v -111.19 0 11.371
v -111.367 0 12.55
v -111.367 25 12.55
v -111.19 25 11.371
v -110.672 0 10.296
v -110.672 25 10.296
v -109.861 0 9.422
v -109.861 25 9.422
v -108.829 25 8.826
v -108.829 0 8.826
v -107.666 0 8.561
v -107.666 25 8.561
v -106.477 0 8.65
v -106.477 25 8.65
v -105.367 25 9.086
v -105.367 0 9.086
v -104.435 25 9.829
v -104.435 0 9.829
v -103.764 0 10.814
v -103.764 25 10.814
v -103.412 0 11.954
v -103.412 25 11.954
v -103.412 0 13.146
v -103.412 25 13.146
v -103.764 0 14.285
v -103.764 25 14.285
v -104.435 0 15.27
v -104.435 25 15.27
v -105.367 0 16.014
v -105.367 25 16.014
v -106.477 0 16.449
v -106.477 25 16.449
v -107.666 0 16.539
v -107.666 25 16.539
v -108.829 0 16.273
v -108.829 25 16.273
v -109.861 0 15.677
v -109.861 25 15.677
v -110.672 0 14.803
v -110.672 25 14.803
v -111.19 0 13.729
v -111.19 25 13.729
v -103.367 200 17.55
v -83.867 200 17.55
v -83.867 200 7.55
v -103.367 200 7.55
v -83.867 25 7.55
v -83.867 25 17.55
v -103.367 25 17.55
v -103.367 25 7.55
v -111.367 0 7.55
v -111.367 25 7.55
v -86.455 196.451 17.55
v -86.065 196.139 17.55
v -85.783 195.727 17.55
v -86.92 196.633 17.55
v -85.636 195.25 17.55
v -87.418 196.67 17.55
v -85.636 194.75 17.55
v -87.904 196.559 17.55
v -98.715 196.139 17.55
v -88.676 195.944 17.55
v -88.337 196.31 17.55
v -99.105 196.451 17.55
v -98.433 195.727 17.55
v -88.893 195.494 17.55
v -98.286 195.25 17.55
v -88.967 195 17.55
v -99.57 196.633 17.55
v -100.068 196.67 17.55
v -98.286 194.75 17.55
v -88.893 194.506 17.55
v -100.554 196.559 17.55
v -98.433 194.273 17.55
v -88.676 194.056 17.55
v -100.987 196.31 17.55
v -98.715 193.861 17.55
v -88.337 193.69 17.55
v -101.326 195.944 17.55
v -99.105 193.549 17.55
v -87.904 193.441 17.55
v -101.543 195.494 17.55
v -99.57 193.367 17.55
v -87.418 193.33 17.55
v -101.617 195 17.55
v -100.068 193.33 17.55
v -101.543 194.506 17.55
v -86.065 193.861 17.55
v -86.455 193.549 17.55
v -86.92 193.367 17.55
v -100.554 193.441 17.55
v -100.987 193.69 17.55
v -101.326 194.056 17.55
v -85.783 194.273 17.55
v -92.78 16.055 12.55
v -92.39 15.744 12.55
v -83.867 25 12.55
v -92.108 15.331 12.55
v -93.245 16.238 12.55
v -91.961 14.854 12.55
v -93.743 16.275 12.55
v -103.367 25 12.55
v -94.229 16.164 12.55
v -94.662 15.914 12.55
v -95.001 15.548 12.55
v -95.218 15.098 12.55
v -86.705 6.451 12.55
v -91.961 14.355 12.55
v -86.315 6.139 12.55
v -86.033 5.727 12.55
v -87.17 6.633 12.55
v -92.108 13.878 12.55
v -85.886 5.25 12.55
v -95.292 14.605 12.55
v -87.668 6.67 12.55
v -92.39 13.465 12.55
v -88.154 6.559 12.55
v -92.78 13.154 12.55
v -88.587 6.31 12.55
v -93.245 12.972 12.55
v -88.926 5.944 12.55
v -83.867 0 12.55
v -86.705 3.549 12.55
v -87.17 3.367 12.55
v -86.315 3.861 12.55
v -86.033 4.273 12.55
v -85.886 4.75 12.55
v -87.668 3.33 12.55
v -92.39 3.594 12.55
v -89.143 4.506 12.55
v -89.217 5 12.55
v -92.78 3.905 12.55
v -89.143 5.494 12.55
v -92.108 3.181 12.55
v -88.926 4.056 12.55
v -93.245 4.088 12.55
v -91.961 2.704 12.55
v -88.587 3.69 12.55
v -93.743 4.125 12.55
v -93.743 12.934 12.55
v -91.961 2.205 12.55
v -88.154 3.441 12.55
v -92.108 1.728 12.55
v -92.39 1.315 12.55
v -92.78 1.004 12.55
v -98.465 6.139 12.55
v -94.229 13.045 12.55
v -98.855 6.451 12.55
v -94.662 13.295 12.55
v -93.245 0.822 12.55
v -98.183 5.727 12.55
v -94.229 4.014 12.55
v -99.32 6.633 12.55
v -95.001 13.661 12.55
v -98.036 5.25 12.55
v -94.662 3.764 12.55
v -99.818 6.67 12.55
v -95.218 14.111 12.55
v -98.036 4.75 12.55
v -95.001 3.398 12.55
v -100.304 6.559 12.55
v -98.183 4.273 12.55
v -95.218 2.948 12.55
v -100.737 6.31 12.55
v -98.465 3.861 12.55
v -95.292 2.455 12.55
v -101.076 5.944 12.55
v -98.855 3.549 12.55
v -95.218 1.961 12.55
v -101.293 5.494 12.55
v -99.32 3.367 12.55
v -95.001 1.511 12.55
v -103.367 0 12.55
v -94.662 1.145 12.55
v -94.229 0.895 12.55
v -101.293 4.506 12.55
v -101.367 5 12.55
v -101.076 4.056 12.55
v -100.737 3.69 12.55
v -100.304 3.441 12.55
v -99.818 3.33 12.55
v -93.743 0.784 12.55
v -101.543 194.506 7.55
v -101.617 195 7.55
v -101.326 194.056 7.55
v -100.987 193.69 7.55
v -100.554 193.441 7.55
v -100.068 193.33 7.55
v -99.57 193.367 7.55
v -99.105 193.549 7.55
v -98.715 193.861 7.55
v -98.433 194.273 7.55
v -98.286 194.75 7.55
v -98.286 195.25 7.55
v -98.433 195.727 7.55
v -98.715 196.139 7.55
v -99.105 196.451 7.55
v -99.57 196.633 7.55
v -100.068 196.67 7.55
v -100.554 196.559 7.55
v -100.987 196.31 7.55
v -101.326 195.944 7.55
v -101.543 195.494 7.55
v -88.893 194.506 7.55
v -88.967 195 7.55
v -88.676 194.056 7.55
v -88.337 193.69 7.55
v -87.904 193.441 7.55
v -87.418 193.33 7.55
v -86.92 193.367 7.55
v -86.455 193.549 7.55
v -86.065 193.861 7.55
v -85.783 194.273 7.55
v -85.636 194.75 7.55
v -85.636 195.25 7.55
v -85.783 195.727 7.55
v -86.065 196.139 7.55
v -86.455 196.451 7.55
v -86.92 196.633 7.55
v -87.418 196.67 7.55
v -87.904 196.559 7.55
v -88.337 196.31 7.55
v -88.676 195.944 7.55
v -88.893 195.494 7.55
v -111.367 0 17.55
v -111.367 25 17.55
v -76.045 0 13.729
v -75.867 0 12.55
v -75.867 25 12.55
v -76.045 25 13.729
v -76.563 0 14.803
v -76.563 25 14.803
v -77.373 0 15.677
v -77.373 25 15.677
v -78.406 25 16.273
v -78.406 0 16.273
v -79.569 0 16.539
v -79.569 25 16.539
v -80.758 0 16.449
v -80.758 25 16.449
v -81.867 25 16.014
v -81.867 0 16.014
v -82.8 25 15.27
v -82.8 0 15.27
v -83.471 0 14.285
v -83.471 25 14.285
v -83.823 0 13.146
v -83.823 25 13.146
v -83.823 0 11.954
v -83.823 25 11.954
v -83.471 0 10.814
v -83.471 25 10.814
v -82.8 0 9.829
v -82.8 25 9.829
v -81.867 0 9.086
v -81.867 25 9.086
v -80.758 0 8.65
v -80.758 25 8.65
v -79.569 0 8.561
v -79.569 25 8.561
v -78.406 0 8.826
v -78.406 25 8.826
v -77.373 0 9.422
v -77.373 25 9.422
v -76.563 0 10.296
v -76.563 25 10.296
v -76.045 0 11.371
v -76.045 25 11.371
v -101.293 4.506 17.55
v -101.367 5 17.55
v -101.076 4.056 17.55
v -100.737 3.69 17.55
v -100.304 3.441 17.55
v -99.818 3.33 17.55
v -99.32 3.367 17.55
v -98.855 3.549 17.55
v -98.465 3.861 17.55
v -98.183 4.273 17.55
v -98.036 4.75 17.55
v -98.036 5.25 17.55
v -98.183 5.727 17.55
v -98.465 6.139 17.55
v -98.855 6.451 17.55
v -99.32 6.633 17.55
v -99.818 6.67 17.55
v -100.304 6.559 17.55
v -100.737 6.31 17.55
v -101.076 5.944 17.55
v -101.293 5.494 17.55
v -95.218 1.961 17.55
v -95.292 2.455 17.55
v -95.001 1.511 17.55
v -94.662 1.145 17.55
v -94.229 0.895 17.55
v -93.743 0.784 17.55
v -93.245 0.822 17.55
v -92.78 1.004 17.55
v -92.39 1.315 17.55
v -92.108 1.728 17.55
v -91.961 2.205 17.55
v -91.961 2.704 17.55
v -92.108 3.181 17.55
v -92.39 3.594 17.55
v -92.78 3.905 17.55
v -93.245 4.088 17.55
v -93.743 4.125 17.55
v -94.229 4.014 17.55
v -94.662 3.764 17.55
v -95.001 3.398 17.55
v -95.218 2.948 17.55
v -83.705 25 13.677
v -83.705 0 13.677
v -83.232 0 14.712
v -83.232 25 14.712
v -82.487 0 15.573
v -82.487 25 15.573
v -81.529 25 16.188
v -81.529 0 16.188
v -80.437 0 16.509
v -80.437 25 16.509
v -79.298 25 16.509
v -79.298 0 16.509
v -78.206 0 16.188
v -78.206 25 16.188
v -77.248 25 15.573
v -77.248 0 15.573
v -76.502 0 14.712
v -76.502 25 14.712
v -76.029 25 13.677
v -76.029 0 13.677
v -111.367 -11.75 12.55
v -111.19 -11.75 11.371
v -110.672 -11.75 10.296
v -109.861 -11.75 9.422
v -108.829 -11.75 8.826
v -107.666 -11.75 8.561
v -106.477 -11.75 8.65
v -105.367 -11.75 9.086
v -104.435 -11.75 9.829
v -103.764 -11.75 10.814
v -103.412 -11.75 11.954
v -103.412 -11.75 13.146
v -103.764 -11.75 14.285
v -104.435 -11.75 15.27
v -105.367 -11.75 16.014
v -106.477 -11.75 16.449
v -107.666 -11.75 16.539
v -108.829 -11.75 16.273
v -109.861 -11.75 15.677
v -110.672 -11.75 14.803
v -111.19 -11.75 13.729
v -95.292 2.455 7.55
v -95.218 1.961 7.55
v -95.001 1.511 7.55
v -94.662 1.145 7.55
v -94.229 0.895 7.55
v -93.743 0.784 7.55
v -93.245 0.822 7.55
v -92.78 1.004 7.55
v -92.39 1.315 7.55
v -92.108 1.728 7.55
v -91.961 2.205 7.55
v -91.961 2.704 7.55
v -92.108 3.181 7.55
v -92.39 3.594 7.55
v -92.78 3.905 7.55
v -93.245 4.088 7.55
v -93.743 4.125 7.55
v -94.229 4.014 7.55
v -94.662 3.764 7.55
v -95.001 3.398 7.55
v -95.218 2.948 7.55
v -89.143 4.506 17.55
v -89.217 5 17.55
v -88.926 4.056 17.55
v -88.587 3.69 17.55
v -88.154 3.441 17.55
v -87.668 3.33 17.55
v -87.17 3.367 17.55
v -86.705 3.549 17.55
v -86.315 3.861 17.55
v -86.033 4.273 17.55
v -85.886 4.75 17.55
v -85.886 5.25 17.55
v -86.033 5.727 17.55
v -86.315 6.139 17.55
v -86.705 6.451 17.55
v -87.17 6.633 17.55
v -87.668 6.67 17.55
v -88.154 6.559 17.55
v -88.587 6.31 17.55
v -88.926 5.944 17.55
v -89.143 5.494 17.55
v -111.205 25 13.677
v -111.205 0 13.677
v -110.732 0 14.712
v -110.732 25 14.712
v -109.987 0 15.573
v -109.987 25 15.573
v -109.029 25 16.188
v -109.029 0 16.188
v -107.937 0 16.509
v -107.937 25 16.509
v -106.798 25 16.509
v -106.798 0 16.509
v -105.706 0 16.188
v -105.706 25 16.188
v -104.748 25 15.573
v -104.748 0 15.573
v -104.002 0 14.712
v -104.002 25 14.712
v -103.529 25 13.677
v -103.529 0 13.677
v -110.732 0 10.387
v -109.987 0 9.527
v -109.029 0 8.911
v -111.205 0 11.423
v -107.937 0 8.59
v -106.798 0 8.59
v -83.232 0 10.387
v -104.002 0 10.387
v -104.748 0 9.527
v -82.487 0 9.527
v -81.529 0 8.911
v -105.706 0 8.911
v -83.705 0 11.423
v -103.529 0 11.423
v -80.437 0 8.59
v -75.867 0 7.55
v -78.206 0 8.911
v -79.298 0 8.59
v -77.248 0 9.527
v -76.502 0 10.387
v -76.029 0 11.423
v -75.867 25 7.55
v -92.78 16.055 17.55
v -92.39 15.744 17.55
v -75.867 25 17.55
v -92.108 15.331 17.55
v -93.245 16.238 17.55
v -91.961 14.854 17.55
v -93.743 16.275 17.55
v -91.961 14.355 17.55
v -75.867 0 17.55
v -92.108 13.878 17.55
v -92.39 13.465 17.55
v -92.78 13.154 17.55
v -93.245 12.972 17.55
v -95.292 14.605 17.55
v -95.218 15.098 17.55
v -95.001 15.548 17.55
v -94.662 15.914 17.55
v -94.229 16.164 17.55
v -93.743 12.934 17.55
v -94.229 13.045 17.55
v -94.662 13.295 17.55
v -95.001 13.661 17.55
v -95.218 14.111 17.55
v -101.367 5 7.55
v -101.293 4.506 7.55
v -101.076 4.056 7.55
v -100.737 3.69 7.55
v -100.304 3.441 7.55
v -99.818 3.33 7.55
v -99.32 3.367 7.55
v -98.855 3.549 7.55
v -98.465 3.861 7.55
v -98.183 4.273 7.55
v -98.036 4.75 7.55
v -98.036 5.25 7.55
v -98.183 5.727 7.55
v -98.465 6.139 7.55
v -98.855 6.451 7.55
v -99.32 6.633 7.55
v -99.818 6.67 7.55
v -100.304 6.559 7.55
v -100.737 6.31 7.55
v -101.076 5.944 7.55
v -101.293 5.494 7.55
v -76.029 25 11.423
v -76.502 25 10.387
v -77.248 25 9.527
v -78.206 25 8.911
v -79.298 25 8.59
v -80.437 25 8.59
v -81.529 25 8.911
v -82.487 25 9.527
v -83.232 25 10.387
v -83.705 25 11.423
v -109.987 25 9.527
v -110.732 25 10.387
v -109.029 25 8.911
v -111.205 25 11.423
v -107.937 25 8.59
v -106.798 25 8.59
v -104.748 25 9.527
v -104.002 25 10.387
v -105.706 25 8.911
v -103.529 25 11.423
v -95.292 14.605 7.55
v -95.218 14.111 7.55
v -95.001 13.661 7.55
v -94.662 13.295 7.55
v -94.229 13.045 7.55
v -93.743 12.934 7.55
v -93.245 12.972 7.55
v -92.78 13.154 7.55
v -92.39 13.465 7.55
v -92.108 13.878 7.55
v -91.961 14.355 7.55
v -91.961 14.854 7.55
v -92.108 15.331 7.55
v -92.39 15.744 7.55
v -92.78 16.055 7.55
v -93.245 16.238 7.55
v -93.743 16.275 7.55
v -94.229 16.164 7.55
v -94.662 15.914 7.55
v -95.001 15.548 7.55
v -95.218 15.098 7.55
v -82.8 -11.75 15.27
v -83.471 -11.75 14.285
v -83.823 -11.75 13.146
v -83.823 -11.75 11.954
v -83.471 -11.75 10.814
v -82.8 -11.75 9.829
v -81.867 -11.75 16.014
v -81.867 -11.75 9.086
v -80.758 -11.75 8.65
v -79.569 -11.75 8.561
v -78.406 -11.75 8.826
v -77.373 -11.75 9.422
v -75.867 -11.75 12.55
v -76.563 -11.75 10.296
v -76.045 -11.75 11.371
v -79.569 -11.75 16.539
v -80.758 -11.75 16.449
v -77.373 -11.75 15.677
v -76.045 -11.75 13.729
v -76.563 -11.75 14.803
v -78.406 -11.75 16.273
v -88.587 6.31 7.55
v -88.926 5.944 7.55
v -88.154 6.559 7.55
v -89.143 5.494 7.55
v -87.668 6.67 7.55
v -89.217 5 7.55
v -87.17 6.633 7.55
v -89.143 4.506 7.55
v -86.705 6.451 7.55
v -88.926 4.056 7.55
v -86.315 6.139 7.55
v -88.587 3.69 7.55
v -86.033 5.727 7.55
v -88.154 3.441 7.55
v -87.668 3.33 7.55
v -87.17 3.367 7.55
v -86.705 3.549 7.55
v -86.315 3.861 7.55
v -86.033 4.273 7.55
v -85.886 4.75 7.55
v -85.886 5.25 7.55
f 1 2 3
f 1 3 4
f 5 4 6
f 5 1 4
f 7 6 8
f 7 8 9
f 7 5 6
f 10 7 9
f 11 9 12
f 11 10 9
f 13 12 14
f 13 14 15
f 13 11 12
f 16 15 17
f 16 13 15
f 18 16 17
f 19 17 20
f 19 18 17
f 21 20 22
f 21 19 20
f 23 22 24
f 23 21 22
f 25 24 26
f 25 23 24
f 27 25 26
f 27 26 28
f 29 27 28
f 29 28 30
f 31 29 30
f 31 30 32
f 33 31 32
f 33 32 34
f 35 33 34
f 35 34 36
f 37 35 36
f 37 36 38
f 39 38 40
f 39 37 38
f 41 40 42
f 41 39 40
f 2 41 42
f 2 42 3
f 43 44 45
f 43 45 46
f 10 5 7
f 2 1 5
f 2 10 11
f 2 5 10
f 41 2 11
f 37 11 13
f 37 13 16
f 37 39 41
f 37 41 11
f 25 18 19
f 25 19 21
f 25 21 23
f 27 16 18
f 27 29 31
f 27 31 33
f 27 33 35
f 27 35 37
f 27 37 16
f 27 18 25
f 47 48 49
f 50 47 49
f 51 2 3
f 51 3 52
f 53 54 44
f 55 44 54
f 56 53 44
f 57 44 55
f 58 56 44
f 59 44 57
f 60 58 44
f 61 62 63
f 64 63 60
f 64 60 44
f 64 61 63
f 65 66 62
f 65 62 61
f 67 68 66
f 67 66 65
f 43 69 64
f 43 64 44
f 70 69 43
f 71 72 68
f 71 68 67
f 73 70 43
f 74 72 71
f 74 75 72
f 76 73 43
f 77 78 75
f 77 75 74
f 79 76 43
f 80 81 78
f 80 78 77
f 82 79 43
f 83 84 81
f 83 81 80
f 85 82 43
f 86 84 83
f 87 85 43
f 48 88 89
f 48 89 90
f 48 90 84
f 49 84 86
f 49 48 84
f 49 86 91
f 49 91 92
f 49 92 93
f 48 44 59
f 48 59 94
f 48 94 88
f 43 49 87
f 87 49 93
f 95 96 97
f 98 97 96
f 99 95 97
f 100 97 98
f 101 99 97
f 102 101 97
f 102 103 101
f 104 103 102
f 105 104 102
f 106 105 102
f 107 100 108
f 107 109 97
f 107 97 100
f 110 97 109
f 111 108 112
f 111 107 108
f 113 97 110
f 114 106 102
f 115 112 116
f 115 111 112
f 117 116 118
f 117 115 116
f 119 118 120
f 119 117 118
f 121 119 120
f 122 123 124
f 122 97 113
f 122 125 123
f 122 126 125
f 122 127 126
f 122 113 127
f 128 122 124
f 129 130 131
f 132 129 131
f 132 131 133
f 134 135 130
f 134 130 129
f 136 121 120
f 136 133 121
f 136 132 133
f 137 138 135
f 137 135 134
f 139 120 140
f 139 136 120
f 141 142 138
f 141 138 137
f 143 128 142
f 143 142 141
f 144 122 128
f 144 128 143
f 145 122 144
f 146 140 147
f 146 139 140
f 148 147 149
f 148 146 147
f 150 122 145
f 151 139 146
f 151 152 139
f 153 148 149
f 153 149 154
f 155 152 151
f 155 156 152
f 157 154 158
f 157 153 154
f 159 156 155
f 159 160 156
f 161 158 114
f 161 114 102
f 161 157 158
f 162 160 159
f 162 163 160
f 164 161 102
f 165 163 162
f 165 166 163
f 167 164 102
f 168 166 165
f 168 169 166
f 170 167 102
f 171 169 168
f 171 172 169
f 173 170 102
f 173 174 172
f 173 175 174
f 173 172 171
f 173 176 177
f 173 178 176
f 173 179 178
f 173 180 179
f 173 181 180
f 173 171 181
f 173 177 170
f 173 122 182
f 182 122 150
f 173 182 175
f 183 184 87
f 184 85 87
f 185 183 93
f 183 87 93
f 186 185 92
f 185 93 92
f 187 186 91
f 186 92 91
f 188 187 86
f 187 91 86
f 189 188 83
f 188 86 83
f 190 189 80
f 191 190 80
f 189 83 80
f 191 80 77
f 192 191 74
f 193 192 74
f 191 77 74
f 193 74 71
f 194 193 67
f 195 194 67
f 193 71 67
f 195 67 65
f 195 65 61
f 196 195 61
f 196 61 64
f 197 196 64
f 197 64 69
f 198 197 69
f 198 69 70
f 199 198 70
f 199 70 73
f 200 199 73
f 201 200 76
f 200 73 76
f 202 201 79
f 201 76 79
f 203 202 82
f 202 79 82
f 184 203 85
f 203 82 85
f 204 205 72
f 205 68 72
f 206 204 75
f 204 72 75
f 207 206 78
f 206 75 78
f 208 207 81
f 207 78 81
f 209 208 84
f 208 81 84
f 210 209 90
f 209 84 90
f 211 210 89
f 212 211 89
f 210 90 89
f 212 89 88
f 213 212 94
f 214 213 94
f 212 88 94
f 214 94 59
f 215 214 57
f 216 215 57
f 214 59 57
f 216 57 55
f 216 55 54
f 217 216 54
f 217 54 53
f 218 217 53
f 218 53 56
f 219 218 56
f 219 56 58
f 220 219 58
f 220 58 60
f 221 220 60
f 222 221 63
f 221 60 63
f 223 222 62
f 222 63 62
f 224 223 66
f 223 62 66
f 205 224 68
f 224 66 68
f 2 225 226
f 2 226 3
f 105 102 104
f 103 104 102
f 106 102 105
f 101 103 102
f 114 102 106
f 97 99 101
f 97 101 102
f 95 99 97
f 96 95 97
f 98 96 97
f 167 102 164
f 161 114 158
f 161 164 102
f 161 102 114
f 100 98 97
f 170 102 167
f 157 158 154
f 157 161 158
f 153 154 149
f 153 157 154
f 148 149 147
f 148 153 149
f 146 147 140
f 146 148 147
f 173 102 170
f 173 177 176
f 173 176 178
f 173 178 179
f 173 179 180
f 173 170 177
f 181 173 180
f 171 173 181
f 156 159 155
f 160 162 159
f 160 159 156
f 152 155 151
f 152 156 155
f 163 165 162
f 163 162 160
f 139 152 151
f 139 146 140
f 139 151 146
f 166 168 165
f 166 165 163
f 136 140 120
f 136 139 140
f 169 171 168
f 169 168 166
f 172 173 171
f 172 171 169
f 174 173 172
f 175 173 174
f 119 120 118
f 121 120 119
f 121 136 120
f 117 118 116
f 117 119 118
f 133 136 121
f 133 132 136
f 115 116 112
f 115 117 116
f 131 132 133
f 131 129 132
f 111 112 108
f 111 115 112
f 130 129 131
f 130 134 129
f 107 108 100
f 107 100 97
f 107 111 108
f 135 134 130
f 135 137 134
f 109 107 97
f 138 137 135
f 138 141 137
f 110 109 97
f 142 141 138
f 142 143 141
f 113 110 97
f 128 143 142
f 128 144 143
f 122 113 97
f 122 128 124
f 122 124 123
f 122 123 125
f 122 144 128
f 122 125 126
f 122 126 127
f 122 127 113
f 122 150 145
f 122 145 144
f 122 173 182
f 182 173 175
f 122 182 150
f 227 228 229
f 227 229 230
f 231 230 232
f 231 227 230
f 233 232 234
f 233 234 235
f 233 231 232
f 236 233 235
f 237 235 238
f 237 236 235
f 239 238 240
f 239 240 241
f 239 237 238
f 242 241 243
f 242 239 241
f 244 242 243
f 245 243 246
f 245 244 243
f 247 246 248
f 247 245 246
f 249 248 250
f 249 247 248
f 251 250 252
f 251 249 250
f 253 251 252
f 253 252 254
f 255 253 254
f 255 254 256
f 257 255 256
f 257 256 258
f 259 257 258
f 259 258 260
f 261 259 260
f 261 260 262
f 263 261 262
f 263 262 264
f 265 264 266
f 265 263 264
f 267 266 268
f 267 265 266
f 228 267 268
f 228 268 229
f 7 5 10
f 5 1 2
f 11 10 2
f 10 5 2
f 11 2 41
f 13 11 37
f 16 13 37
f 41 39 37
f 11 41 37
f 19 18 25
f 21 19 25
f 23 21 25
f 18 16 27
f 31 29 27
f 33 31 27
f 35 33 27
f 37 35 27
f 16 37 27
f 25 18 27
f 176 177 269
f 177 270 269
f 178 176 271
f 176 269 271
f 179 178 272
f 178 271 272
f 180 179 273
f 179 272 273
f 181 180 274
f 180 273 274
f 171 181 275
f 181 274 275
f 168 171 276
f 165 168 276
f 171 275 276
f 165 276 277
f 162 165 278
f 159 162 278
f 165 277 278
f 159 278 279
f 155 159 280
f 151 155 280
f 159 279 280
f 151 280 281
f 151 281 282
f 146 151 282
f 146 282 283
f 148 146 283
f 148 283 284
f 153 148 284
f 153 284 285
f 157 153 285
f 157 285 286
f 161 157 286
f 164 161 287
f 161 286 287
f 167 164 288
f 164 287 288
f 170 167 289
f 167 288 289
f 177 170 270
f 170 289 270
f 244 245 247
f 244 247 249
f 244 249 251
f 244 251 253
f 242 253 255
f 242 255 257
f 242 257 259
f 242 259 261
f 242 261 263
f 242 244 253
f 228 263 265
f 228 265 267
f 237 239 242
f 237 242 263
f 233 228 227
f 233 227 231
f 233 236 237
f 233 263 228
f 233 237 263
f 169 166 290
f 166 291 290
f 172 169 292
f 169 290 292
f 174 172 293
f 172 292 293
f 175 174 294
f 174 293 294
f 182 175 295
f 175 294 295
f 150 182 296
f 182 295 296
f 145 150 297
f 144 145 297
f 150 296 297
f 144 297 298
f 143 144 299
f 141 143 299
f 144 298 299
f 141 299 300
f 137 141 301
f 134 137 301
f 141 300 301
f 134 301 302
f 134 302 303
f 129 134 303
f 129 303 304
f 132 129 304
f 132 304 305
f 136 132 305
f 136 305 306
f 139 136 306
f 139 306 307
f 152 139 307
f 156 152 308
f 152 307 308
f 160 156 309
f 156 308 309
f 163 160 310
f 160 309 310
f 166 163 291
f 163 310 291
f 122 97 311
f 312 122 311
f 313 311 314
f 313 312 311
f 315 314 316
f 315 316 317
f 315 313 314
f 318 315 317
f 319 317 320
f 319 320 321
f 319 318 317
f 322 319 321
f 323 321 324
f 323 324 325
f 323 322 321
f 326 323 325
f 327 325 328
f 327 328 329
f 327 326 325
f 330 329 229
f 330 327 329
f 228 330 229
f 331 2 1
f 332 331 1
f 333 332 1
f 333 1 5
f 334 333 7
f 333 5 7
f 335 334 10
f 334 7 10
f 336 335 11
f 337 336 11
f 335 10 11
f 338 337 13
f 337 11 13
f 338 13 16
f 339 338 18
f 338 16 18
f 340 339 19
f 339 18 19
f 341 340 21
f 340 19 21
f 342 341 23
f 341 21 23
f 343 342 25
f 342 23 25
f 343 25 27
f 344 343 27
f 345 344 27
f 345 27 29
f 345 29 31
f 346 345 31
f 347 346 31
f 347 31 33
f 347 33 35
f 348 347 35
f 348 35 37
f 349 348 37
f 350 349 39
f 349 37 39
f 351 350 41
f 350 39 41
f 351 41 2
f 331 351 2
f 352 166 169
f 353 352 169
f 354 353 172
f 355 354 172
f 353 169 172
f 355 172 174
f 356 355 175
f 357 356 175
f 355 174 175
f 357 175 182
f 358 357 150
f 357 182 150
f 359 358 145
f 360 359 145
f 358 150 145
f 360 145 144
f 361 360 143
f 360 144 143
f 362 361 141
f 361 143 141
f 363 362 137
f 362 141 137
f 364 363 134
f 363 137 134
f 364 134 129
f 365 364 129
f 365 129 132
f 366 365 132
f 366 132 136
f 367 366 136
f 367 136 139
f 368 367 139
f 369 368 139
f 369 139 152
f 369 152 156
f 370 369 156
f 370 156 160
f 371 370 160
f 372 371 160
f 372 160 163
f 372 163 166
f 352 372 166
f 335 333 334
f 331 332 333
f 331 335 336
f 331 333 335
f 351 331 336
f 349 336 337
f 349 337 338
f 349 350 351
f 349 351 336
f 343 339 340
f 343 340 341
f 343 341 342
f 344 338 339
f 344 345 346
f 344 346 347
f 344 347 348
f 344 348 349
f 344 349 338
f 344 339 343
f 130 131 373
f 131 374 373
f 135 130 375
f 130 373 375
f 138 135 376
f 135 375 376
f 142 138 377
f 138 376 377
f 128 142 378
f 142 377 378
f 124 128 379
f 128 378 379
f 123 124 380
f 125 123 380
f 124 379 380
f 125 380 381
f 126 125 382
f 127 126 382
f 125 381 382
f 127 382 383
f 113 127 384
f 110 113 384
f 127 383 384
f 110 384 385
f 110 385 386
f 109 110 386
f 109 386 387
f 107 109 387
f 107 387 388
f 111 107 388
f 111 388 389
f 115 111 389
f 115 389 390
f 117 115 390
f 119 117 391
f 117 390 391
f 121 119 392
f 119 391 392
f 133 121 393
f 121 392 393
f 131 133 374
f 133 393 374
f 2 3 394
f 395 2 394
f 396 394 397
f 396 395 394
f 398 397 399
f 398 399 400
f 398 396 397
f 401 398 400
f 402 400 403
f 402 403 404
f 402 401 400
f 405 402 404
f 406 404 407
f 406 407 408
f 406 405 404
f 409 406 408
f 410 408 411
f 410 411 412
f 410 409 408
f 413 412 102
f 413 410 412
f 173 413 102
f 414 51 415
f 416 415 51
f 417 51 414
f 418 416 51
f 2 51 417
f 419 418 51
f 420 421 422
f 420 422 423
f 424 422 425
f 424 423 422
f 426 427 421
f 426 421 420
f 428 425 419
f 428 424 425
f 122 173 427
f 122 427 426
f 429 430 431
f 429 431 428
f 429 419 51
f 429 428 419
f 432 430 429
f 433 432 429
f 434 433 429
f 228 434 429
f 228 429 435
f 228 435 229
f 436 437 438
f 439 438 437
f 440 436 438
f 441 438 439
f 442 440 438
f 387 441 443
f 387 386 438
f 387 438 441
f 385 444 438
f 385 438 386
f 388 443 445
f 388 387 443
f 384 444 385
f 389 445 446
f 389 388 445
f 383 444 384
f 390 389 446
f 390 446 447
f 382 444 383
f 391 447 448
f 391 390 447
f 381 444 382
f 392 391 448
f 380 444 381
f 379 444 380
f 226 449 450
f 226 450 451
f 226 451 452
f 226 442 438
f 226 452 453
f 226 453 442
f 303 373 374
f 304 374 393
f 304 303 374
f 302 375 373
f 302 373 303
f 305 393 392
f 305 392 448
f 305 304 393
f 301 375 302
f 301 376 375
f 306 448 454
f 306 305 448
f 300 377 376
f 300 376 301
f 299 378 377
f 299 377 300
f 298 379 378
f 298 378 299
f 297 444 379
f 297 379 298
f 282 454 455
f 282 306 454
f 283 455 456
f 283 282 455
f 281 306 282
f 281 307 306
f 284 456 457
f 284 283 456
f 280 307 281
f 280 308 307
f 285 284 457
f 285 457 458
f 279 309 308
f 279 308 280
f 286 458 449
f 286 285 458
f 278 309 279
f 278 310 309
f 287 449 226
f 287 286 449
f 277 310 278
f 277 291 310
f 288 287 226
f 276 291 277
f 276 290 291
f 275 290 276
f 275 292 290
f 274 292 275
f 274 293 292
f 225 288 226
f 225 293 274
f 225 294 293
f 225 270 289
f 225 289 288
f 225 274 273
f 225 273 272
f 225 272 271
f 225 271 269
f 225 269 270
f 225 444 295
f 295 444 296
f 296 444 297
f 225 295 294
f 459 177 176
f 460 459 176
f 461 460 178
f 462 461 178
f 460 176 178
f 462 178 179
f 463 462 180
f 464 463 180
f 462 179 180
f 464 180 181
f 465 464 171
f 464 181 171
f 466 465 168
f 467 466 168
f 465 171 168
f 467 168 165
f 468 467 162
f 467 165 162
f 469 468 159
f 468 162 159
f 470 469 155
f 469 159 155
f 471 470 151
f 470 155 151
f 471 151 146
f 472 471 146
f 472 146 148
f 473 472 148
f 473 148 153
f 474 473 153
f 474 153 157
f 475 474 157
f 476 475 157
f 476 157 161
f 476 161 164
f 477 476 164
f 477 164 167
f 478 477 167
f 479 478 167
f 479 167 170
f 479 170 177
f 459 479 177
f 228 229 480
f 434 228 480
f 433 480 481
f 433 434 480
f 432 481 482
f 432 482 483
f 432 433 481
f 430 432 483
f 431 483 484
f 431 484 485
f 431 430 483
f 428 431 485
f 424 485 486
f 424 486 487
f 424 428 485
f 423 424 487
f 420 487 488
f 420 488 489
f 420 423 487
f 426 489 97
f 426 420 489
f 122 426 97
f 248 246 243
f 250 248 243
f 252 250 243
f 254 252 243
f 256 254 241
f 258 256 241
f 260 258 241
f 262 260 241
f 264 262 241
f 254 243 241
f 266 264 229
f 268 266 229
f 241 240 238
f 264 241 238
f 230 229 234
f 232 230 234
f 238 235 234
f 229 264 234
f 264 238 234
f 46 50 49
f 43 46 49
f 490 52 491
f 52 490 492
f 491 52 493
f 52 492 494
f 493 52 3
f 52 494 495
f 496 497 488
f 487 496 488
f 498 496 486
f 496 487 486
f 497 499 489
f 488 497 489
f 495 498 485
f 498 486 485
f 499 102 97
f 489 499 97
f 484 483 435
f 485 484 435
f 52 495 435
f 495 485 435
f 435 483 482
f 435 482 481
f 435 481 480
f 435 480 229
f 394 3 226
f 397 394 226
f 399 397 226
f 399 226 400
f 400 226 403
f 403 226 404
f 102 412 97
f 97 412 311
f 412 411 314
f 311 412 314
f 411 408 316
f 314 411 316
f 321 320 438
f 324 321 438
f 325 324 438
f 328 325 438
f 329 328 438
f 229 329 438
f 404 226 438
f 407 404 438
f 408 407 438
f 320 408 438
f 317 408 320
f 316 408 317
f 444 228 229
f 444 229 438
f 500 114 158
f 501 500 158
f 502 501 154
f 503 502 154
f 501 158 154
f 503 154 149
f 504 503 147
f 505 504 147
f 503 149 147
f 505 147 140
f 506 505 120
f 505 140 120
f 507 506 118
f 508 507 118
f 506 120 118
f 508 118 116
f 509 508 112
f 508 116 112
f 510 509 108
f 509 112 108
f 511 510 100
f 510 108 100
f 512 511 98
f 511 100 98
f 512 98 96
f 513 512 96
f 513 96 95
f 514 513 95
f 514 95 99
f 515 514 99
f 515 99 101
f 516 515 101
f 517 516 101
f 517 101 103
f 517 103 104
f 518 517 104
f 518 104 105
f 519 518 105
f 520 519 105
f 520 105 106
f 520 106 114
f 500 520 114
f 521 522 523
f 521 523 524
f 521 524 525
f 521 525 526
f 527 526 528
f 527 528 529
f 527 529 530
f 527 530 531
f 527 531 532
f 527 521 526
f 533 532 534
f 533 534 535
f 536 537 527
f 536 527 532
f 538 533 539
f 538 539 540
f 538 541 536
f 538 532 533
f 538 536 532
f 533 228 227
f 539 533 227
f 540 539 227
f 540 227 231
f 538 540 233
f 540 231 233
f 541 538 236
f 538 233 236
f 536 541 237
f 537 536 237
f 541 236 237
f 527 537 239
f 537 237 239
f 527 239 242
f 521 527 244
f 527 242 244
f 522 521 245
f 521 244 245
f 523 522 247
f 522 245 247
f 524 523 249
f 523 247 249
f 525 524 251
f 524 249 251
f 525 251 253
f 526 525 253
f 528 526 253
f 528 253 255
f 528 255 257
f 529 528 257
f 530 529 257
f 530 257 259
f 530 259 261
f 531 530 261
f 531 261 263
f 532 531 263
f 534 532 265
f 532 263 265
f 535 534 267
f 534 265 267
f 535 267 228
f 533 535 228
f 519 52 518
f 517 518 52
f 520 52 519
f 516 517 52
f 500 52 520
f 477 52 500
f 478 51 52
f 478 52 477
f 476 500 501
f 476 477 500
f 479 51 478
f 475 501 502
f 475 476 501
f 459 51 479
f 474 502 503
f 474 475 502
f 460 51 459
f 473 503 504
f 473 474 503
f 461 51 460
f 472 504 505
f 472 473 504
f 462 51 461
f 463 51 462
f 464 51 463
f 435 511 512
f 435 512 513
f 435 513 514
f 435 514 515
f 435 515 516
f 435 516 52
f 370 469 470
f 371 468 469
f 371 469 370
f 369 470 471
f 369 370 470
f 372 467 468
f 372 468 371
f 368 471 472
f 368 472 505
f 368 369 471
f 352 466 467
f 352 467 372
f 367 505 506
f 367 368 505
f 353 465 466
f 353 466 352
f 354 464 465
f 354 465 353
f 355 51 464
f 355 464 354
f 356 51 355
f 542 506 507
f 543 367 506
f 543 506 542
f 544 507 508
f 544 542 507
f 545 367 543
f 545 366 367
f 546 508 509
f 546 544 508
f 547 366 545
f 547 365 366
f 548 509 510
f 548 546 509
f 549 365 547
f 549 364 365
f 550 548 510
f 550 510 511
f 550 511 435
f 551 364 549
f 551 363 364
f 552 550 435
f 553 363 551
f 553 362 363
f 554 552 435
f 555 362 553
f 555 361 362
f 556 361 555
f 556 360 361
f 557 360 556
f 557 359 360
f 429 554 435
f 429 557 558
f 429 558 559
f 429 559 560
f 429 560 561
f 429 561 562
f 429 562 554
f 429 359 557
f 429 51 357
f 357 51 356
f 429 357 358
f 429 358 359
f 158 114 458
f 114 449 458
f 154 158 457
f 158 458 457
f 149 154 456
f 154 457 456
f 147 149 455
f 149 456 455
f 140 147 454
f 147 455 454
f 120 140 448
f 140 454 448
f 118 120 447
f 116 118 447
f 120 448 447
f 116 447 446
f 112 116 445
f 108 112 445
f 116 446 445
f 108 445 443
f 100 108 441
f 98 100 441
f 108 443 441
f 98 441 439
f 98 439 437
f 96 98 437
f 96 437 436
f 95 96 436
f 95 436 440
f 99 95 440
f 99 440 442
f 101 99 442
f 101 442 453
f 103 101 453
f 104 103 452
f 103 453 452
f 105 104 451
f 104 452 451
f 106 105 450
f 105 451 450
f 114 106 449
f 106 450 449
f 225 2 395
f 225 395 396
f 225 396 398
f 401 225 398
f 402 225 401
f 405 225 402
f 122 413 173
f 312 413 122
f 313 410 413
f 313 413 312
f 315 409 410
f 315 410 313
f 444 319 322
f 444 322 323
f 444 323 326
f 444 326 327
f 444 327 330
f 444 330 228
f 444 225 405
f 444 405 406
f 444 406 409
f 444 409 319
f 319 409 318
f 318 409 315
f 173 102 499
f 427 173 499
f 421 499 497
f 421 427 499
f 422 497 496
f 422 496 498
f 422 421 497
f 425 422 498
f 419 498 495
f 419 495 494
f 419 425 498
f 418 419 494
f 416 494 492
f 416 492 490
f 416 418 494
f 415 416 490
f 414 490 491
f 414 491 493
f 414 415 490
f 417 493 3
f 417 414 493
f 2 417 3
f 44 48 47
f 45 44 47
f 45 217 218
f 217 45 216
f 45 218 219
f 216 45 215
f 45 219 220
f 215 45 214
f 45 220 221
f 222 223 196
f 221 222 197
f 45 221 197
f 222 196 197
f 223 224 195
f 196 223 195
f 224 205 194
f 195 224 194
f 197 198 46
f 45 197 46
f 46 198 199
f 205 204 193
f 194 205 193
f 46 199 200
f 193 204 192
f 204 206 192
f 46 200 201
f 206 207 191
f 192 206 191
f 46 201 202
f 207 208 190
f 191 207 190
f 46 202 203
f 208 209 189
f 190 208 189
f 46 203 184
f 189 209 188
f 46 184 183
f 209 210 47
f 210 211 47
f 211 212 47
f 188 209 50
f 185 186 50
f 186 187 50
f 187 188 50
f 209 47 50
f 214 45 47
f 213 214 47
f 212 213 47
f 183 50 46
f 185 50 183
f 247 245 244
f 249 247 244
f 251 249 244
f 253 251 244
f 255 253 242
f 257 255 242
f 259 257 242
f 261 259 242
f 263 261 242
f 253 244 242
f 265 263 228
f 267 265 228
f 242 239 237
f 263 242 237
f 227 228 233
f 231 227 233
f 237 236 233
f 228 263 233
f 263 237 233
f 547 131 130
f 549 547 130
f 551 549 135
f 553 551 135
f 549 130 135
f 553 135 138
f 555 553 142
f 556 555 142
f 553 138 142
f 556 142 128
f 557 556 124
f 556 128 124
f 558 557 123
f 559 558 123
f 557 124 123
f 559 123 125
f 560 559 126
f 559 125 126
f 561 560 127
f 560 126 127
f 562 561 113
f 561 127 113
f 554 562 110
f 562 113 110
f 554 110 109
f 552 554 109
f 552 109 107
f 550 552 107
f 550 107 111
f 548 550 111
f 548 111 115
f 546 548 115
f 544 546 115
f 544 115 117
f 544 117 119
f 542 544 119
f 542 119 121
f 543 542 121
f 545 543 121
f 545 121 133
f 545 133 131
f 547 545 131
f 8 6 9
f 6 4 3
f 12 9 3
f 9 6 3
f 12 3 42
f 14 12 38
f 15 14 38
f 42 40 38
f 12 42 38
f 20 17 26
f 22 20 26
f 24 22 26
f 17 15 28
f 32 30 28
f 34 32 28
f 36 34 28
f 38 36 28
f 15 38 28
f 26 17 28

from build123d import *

# Parameters (mm, degrees)
F1_DEPTH   = 11.75
F2_DEPTH   = 25
F3_DEPTH   = 25
F4_DEPTH   = 25
F5_W       = 19.5
F5_H       = 5
F6_DEPTH   = 175
F8_D       = 3.35
F8_DEPTH   = 10
F8_TIP     = 1.0064415369
F8_2_D     = 3.35
F8_2_DEPTH = 10
F8_2_TIP   = 1.0064415369
F8_3_D     = 3.35
F8_3_DEPTH = 10
F8_3_TIP   = 1.0064415369


with BuildPart() as f1:
    # F0 (on Front) → F1 (new body)
    with BuildSketch(Plane.XZ):
        with BuildLine():
            ThreePointArc((-83.867456615, 12.549745962), (-79.867456615, 8.549745962), (-75.867456615, 12.549745962))
            Line((-75.867456615, 12.549745962), (-79.867456615, 12.549745962))
            Line((-79.867456615, 12.549745962), (-83.867456615, 12.549745962))
        make_face()
        with BuildLine():
            Line((-79.867456615, 12.549745962), (-75.867456615, 12.549745962))
            ThreePointArc((-75.867456615, 12.549745962), (-79.867456615, 16.549745962), (-83.867456615, 12.549745962))
            Line((-83.867456615, 12.549745962), (-79.867456615, 12.549745962))
        make_face()
    extrude(amount=F1_DEPTH)


with BuildPart() as f1b:
    # F0 (on Front) → F1, piece 2 (new body)
    with BuildSketch(Plane.XZ):
        with BuildLine():
            ThreePointArc((-103.367456615, 12.549745962), (-107.367456615, 16.549745962), (-111.367456615, 12.549745962))
            Line((-111.367456615, 12.549745962), (-107.367456615, 12.549745962))
            Line((-107.367456615, 12.549745962), (-103.367456615, 12.549745962))
        make_face()
        with BuildLine():
            Line((-107.367456615, 12.549745962), (-111.367456615, 12.549745962))
            ThreePointArc((-111.367456615, 12.549745962), (-107.367456615, 8.549745962), (-103.367456615, 12.549745962))
            Line((-103.367456615, 12.549745962), (-107.367456615, 12.549745962))
        make_face()
    extrude(amount=F1_DEPTH)


with BuildPart() as f2:
    # F0 (on Front) → F2 (new body)
    with BuildSketch(Plane.XZ):
        with BuildLine():
            Line((-75.867456615, 7.549745962), (-75.867456615, 12.549745962))
            ThreePointArc((-75.867456615, 12.549745962), (-79.867456615, 8.549745962), (-83.867456615, 12.549745962))
            Line((-83.867456615, 12.549745962), (-103.367456615, 12.549745962))
            ThreePointArc((-103.367456615, 12.549745962), (-107.367456615, 8.549745962), (-111.367456615, 12.549745962))
            Line((-111.367456615, 12.549745962), (-111.367456615, 7.549745962))
            Line((-111.367456615, 7.549745962), (-75.867456615, 7.549745962))
        make_face()
    extrude(amount=-F2_DEPTH)

    # F8
    with Locations(Plane(origin=(0, 0, 7.549745962), x_dir=(1, 0, 0), z_dir=(0, 0, -1))):
        with Locations((-99.692456615, -5), (-87.542456615, -5), (-99.942456615, -195), (-87.292456615, -195), (-93.617456615, -14.6046723992), (-93.617456615, -2.4546723992)):
            Hole(F8_D / 2, depth=F8_DEPTH)
            with Locations((0, 0, -(F8_DEPTH + F8_TIP / 2))):  # 118° drill point
                Cone(0, F8_D / 2, F8_TIP, mode=Mode.SUBTRACT)


with BuildPart() as f3:
    # F0 (on Front) → F3 (new body)
    with BuildSketch(Plane.XZ):
        with BuildLine():
            Line((-75.867456615, 12.549745962), (-75.867456615, 17.549745962))
            Line((-75.867456615, 17.549745962), (-111.367456615, 17.549745962))
            Line((-111.367456615, 17.549745962), (-111.367456615, 12.549745962))
            ThreePointArc((-111.367456615, 12.549745962), (-107.367456615, 16.549745962), (-103.367456615, 12.549745962))
            Line((-103.367456615, 12.549745962), (-83.867456615, 12.549745962))
            ThreePointArc((-83.867456615, 12.549745962), (-79.867456615, 16.549745962), (-75.867456615, 12.549745962))
        make_face()
    extrude(amount=-F3_DEPTH)

    # F8#2
    with Locations(Plane(origin=(0, 0, 7.549745962), x_dir=(1, 0, 0), z_dir=(0, 0, -1))):
        with Locations((-99.692456615, -5), (-87.542456615, -5), (-99.942456615, -195), (-87.292456615, -195), (-93.617456615, -14.6046723992), (-93.617456615, -2.4546723992)):
            Hole(F8_2_D / 2, depth=F8_2_DEPTH)
            with Locations((0, 0, -(F8_2_DEPTH + F8_2_TIP / 2))):  # 118° drill point
                Cone(0, F8_2_D / 2, F8_2_TIP, mode=Mode.SUBTRACT)


with BuildPart() as f4:
    # F0 (on Front) → F4 (new body)
    with BuildSketch(Plane.XZ):
        with BuildLine():
            ThreePointArc((-83.867456615, 12.549745962), (-79.867456615, 8.549745962), (-75.867456615, 12.549745962))
            Line((-75.867456615, 12.549745962), (-79.867456615, 12.549745962))
            Line((-79.867456615, 12.549745962), (-83.867456615, 12.549745962))
        make_face()
        with BuildLine():
            Line((-79.867456615, 12.549745962), (-75.867456615, 12.549745962))
            ThreePointArc((-75.867456615, 12.549745962), (-79.867456615, 16.549745962), (-83.867456615, 12.549745962))
            Line((-83.867456615, 12.549745962), (-79.867456615, 12.549745962))
        make_face()
    extrude(amount=-F4_DEPTH)


with BuildPart() as f4b:
    # F0 (on Front) → F4, piece 2 (new body)
    with BuildSketch(Plane.XZ):
        with BuildLine():
            ThreePointArc((-103.367456615, 12.549745962), (-107.367456615, 16.549745962), (-111.367456615, 12.549745962))
            Line((-111.367456615, 12.549745962), (-107.367456615, 12.549745962))
            Line((-107.367456615, 12.549745962), (-103.367456615, 12.549745962))
        make_face()
        with BuildLine():
            Line((-107.367456615, 12.549745962), (-111.367456615, 12.549745962))
            ThreePointArc((-111.367456615, 12.549745962), (-107.367456615, 8.549745962), (-103.367456615, 12.549745962))
            Line((-103.367456615, 12.549745962), (-107.367456615, 12.549745962))
        make_face()
    extrude(amount=-F4_DEPTH)


with BuildPart() as f6:
    # F5 (on face) → F6 (new body)
    with BuildSketch(Plane(origin=(0, 25, 0), x_dir=(-1, 0, 0), z_dir=(0, 1, 0))):
        with Locations((93.617456615, 15.049745962)):
            Rectangle(F5_W, F5_H)
        Polygon((100.994568646, 7.549745962), (103.367456615, 7.549745962), (103.367456615, 12.549745962), (83.867456615, 12.549745962), (83.867456615, 7.549745962), align=None)
    extrude(amount=F6_DEPTH)

    # F8#3
    with Locations(Plane(origin=(0, 0, 7.549745962), x_dir=(1, 0, 0), z_dir=(0, 0, -1))):
        with Locations((-99.692456615, -5), (-87.542456615, -5), (-99.942456615, -195), (-87.292456615, -195), (-93.617456615, -14.6046723992), (-93.617456615, -2.4546723992)):
            Hole(F8_3_D / 2, depth=F8_3_DEPTH)
            with Locations((0, 0, -(F8_3_DEPTH + F8_3_TIP / 2))):  # 118° drill point
                Cone(0, F8_3_D / 2, F8_3_TIP, mode=Mode.SUBTRACT)


solid = Compound([f1.part, f1b.part, f2.part, f3.part, f4.part, f4b.part, f6.part])
